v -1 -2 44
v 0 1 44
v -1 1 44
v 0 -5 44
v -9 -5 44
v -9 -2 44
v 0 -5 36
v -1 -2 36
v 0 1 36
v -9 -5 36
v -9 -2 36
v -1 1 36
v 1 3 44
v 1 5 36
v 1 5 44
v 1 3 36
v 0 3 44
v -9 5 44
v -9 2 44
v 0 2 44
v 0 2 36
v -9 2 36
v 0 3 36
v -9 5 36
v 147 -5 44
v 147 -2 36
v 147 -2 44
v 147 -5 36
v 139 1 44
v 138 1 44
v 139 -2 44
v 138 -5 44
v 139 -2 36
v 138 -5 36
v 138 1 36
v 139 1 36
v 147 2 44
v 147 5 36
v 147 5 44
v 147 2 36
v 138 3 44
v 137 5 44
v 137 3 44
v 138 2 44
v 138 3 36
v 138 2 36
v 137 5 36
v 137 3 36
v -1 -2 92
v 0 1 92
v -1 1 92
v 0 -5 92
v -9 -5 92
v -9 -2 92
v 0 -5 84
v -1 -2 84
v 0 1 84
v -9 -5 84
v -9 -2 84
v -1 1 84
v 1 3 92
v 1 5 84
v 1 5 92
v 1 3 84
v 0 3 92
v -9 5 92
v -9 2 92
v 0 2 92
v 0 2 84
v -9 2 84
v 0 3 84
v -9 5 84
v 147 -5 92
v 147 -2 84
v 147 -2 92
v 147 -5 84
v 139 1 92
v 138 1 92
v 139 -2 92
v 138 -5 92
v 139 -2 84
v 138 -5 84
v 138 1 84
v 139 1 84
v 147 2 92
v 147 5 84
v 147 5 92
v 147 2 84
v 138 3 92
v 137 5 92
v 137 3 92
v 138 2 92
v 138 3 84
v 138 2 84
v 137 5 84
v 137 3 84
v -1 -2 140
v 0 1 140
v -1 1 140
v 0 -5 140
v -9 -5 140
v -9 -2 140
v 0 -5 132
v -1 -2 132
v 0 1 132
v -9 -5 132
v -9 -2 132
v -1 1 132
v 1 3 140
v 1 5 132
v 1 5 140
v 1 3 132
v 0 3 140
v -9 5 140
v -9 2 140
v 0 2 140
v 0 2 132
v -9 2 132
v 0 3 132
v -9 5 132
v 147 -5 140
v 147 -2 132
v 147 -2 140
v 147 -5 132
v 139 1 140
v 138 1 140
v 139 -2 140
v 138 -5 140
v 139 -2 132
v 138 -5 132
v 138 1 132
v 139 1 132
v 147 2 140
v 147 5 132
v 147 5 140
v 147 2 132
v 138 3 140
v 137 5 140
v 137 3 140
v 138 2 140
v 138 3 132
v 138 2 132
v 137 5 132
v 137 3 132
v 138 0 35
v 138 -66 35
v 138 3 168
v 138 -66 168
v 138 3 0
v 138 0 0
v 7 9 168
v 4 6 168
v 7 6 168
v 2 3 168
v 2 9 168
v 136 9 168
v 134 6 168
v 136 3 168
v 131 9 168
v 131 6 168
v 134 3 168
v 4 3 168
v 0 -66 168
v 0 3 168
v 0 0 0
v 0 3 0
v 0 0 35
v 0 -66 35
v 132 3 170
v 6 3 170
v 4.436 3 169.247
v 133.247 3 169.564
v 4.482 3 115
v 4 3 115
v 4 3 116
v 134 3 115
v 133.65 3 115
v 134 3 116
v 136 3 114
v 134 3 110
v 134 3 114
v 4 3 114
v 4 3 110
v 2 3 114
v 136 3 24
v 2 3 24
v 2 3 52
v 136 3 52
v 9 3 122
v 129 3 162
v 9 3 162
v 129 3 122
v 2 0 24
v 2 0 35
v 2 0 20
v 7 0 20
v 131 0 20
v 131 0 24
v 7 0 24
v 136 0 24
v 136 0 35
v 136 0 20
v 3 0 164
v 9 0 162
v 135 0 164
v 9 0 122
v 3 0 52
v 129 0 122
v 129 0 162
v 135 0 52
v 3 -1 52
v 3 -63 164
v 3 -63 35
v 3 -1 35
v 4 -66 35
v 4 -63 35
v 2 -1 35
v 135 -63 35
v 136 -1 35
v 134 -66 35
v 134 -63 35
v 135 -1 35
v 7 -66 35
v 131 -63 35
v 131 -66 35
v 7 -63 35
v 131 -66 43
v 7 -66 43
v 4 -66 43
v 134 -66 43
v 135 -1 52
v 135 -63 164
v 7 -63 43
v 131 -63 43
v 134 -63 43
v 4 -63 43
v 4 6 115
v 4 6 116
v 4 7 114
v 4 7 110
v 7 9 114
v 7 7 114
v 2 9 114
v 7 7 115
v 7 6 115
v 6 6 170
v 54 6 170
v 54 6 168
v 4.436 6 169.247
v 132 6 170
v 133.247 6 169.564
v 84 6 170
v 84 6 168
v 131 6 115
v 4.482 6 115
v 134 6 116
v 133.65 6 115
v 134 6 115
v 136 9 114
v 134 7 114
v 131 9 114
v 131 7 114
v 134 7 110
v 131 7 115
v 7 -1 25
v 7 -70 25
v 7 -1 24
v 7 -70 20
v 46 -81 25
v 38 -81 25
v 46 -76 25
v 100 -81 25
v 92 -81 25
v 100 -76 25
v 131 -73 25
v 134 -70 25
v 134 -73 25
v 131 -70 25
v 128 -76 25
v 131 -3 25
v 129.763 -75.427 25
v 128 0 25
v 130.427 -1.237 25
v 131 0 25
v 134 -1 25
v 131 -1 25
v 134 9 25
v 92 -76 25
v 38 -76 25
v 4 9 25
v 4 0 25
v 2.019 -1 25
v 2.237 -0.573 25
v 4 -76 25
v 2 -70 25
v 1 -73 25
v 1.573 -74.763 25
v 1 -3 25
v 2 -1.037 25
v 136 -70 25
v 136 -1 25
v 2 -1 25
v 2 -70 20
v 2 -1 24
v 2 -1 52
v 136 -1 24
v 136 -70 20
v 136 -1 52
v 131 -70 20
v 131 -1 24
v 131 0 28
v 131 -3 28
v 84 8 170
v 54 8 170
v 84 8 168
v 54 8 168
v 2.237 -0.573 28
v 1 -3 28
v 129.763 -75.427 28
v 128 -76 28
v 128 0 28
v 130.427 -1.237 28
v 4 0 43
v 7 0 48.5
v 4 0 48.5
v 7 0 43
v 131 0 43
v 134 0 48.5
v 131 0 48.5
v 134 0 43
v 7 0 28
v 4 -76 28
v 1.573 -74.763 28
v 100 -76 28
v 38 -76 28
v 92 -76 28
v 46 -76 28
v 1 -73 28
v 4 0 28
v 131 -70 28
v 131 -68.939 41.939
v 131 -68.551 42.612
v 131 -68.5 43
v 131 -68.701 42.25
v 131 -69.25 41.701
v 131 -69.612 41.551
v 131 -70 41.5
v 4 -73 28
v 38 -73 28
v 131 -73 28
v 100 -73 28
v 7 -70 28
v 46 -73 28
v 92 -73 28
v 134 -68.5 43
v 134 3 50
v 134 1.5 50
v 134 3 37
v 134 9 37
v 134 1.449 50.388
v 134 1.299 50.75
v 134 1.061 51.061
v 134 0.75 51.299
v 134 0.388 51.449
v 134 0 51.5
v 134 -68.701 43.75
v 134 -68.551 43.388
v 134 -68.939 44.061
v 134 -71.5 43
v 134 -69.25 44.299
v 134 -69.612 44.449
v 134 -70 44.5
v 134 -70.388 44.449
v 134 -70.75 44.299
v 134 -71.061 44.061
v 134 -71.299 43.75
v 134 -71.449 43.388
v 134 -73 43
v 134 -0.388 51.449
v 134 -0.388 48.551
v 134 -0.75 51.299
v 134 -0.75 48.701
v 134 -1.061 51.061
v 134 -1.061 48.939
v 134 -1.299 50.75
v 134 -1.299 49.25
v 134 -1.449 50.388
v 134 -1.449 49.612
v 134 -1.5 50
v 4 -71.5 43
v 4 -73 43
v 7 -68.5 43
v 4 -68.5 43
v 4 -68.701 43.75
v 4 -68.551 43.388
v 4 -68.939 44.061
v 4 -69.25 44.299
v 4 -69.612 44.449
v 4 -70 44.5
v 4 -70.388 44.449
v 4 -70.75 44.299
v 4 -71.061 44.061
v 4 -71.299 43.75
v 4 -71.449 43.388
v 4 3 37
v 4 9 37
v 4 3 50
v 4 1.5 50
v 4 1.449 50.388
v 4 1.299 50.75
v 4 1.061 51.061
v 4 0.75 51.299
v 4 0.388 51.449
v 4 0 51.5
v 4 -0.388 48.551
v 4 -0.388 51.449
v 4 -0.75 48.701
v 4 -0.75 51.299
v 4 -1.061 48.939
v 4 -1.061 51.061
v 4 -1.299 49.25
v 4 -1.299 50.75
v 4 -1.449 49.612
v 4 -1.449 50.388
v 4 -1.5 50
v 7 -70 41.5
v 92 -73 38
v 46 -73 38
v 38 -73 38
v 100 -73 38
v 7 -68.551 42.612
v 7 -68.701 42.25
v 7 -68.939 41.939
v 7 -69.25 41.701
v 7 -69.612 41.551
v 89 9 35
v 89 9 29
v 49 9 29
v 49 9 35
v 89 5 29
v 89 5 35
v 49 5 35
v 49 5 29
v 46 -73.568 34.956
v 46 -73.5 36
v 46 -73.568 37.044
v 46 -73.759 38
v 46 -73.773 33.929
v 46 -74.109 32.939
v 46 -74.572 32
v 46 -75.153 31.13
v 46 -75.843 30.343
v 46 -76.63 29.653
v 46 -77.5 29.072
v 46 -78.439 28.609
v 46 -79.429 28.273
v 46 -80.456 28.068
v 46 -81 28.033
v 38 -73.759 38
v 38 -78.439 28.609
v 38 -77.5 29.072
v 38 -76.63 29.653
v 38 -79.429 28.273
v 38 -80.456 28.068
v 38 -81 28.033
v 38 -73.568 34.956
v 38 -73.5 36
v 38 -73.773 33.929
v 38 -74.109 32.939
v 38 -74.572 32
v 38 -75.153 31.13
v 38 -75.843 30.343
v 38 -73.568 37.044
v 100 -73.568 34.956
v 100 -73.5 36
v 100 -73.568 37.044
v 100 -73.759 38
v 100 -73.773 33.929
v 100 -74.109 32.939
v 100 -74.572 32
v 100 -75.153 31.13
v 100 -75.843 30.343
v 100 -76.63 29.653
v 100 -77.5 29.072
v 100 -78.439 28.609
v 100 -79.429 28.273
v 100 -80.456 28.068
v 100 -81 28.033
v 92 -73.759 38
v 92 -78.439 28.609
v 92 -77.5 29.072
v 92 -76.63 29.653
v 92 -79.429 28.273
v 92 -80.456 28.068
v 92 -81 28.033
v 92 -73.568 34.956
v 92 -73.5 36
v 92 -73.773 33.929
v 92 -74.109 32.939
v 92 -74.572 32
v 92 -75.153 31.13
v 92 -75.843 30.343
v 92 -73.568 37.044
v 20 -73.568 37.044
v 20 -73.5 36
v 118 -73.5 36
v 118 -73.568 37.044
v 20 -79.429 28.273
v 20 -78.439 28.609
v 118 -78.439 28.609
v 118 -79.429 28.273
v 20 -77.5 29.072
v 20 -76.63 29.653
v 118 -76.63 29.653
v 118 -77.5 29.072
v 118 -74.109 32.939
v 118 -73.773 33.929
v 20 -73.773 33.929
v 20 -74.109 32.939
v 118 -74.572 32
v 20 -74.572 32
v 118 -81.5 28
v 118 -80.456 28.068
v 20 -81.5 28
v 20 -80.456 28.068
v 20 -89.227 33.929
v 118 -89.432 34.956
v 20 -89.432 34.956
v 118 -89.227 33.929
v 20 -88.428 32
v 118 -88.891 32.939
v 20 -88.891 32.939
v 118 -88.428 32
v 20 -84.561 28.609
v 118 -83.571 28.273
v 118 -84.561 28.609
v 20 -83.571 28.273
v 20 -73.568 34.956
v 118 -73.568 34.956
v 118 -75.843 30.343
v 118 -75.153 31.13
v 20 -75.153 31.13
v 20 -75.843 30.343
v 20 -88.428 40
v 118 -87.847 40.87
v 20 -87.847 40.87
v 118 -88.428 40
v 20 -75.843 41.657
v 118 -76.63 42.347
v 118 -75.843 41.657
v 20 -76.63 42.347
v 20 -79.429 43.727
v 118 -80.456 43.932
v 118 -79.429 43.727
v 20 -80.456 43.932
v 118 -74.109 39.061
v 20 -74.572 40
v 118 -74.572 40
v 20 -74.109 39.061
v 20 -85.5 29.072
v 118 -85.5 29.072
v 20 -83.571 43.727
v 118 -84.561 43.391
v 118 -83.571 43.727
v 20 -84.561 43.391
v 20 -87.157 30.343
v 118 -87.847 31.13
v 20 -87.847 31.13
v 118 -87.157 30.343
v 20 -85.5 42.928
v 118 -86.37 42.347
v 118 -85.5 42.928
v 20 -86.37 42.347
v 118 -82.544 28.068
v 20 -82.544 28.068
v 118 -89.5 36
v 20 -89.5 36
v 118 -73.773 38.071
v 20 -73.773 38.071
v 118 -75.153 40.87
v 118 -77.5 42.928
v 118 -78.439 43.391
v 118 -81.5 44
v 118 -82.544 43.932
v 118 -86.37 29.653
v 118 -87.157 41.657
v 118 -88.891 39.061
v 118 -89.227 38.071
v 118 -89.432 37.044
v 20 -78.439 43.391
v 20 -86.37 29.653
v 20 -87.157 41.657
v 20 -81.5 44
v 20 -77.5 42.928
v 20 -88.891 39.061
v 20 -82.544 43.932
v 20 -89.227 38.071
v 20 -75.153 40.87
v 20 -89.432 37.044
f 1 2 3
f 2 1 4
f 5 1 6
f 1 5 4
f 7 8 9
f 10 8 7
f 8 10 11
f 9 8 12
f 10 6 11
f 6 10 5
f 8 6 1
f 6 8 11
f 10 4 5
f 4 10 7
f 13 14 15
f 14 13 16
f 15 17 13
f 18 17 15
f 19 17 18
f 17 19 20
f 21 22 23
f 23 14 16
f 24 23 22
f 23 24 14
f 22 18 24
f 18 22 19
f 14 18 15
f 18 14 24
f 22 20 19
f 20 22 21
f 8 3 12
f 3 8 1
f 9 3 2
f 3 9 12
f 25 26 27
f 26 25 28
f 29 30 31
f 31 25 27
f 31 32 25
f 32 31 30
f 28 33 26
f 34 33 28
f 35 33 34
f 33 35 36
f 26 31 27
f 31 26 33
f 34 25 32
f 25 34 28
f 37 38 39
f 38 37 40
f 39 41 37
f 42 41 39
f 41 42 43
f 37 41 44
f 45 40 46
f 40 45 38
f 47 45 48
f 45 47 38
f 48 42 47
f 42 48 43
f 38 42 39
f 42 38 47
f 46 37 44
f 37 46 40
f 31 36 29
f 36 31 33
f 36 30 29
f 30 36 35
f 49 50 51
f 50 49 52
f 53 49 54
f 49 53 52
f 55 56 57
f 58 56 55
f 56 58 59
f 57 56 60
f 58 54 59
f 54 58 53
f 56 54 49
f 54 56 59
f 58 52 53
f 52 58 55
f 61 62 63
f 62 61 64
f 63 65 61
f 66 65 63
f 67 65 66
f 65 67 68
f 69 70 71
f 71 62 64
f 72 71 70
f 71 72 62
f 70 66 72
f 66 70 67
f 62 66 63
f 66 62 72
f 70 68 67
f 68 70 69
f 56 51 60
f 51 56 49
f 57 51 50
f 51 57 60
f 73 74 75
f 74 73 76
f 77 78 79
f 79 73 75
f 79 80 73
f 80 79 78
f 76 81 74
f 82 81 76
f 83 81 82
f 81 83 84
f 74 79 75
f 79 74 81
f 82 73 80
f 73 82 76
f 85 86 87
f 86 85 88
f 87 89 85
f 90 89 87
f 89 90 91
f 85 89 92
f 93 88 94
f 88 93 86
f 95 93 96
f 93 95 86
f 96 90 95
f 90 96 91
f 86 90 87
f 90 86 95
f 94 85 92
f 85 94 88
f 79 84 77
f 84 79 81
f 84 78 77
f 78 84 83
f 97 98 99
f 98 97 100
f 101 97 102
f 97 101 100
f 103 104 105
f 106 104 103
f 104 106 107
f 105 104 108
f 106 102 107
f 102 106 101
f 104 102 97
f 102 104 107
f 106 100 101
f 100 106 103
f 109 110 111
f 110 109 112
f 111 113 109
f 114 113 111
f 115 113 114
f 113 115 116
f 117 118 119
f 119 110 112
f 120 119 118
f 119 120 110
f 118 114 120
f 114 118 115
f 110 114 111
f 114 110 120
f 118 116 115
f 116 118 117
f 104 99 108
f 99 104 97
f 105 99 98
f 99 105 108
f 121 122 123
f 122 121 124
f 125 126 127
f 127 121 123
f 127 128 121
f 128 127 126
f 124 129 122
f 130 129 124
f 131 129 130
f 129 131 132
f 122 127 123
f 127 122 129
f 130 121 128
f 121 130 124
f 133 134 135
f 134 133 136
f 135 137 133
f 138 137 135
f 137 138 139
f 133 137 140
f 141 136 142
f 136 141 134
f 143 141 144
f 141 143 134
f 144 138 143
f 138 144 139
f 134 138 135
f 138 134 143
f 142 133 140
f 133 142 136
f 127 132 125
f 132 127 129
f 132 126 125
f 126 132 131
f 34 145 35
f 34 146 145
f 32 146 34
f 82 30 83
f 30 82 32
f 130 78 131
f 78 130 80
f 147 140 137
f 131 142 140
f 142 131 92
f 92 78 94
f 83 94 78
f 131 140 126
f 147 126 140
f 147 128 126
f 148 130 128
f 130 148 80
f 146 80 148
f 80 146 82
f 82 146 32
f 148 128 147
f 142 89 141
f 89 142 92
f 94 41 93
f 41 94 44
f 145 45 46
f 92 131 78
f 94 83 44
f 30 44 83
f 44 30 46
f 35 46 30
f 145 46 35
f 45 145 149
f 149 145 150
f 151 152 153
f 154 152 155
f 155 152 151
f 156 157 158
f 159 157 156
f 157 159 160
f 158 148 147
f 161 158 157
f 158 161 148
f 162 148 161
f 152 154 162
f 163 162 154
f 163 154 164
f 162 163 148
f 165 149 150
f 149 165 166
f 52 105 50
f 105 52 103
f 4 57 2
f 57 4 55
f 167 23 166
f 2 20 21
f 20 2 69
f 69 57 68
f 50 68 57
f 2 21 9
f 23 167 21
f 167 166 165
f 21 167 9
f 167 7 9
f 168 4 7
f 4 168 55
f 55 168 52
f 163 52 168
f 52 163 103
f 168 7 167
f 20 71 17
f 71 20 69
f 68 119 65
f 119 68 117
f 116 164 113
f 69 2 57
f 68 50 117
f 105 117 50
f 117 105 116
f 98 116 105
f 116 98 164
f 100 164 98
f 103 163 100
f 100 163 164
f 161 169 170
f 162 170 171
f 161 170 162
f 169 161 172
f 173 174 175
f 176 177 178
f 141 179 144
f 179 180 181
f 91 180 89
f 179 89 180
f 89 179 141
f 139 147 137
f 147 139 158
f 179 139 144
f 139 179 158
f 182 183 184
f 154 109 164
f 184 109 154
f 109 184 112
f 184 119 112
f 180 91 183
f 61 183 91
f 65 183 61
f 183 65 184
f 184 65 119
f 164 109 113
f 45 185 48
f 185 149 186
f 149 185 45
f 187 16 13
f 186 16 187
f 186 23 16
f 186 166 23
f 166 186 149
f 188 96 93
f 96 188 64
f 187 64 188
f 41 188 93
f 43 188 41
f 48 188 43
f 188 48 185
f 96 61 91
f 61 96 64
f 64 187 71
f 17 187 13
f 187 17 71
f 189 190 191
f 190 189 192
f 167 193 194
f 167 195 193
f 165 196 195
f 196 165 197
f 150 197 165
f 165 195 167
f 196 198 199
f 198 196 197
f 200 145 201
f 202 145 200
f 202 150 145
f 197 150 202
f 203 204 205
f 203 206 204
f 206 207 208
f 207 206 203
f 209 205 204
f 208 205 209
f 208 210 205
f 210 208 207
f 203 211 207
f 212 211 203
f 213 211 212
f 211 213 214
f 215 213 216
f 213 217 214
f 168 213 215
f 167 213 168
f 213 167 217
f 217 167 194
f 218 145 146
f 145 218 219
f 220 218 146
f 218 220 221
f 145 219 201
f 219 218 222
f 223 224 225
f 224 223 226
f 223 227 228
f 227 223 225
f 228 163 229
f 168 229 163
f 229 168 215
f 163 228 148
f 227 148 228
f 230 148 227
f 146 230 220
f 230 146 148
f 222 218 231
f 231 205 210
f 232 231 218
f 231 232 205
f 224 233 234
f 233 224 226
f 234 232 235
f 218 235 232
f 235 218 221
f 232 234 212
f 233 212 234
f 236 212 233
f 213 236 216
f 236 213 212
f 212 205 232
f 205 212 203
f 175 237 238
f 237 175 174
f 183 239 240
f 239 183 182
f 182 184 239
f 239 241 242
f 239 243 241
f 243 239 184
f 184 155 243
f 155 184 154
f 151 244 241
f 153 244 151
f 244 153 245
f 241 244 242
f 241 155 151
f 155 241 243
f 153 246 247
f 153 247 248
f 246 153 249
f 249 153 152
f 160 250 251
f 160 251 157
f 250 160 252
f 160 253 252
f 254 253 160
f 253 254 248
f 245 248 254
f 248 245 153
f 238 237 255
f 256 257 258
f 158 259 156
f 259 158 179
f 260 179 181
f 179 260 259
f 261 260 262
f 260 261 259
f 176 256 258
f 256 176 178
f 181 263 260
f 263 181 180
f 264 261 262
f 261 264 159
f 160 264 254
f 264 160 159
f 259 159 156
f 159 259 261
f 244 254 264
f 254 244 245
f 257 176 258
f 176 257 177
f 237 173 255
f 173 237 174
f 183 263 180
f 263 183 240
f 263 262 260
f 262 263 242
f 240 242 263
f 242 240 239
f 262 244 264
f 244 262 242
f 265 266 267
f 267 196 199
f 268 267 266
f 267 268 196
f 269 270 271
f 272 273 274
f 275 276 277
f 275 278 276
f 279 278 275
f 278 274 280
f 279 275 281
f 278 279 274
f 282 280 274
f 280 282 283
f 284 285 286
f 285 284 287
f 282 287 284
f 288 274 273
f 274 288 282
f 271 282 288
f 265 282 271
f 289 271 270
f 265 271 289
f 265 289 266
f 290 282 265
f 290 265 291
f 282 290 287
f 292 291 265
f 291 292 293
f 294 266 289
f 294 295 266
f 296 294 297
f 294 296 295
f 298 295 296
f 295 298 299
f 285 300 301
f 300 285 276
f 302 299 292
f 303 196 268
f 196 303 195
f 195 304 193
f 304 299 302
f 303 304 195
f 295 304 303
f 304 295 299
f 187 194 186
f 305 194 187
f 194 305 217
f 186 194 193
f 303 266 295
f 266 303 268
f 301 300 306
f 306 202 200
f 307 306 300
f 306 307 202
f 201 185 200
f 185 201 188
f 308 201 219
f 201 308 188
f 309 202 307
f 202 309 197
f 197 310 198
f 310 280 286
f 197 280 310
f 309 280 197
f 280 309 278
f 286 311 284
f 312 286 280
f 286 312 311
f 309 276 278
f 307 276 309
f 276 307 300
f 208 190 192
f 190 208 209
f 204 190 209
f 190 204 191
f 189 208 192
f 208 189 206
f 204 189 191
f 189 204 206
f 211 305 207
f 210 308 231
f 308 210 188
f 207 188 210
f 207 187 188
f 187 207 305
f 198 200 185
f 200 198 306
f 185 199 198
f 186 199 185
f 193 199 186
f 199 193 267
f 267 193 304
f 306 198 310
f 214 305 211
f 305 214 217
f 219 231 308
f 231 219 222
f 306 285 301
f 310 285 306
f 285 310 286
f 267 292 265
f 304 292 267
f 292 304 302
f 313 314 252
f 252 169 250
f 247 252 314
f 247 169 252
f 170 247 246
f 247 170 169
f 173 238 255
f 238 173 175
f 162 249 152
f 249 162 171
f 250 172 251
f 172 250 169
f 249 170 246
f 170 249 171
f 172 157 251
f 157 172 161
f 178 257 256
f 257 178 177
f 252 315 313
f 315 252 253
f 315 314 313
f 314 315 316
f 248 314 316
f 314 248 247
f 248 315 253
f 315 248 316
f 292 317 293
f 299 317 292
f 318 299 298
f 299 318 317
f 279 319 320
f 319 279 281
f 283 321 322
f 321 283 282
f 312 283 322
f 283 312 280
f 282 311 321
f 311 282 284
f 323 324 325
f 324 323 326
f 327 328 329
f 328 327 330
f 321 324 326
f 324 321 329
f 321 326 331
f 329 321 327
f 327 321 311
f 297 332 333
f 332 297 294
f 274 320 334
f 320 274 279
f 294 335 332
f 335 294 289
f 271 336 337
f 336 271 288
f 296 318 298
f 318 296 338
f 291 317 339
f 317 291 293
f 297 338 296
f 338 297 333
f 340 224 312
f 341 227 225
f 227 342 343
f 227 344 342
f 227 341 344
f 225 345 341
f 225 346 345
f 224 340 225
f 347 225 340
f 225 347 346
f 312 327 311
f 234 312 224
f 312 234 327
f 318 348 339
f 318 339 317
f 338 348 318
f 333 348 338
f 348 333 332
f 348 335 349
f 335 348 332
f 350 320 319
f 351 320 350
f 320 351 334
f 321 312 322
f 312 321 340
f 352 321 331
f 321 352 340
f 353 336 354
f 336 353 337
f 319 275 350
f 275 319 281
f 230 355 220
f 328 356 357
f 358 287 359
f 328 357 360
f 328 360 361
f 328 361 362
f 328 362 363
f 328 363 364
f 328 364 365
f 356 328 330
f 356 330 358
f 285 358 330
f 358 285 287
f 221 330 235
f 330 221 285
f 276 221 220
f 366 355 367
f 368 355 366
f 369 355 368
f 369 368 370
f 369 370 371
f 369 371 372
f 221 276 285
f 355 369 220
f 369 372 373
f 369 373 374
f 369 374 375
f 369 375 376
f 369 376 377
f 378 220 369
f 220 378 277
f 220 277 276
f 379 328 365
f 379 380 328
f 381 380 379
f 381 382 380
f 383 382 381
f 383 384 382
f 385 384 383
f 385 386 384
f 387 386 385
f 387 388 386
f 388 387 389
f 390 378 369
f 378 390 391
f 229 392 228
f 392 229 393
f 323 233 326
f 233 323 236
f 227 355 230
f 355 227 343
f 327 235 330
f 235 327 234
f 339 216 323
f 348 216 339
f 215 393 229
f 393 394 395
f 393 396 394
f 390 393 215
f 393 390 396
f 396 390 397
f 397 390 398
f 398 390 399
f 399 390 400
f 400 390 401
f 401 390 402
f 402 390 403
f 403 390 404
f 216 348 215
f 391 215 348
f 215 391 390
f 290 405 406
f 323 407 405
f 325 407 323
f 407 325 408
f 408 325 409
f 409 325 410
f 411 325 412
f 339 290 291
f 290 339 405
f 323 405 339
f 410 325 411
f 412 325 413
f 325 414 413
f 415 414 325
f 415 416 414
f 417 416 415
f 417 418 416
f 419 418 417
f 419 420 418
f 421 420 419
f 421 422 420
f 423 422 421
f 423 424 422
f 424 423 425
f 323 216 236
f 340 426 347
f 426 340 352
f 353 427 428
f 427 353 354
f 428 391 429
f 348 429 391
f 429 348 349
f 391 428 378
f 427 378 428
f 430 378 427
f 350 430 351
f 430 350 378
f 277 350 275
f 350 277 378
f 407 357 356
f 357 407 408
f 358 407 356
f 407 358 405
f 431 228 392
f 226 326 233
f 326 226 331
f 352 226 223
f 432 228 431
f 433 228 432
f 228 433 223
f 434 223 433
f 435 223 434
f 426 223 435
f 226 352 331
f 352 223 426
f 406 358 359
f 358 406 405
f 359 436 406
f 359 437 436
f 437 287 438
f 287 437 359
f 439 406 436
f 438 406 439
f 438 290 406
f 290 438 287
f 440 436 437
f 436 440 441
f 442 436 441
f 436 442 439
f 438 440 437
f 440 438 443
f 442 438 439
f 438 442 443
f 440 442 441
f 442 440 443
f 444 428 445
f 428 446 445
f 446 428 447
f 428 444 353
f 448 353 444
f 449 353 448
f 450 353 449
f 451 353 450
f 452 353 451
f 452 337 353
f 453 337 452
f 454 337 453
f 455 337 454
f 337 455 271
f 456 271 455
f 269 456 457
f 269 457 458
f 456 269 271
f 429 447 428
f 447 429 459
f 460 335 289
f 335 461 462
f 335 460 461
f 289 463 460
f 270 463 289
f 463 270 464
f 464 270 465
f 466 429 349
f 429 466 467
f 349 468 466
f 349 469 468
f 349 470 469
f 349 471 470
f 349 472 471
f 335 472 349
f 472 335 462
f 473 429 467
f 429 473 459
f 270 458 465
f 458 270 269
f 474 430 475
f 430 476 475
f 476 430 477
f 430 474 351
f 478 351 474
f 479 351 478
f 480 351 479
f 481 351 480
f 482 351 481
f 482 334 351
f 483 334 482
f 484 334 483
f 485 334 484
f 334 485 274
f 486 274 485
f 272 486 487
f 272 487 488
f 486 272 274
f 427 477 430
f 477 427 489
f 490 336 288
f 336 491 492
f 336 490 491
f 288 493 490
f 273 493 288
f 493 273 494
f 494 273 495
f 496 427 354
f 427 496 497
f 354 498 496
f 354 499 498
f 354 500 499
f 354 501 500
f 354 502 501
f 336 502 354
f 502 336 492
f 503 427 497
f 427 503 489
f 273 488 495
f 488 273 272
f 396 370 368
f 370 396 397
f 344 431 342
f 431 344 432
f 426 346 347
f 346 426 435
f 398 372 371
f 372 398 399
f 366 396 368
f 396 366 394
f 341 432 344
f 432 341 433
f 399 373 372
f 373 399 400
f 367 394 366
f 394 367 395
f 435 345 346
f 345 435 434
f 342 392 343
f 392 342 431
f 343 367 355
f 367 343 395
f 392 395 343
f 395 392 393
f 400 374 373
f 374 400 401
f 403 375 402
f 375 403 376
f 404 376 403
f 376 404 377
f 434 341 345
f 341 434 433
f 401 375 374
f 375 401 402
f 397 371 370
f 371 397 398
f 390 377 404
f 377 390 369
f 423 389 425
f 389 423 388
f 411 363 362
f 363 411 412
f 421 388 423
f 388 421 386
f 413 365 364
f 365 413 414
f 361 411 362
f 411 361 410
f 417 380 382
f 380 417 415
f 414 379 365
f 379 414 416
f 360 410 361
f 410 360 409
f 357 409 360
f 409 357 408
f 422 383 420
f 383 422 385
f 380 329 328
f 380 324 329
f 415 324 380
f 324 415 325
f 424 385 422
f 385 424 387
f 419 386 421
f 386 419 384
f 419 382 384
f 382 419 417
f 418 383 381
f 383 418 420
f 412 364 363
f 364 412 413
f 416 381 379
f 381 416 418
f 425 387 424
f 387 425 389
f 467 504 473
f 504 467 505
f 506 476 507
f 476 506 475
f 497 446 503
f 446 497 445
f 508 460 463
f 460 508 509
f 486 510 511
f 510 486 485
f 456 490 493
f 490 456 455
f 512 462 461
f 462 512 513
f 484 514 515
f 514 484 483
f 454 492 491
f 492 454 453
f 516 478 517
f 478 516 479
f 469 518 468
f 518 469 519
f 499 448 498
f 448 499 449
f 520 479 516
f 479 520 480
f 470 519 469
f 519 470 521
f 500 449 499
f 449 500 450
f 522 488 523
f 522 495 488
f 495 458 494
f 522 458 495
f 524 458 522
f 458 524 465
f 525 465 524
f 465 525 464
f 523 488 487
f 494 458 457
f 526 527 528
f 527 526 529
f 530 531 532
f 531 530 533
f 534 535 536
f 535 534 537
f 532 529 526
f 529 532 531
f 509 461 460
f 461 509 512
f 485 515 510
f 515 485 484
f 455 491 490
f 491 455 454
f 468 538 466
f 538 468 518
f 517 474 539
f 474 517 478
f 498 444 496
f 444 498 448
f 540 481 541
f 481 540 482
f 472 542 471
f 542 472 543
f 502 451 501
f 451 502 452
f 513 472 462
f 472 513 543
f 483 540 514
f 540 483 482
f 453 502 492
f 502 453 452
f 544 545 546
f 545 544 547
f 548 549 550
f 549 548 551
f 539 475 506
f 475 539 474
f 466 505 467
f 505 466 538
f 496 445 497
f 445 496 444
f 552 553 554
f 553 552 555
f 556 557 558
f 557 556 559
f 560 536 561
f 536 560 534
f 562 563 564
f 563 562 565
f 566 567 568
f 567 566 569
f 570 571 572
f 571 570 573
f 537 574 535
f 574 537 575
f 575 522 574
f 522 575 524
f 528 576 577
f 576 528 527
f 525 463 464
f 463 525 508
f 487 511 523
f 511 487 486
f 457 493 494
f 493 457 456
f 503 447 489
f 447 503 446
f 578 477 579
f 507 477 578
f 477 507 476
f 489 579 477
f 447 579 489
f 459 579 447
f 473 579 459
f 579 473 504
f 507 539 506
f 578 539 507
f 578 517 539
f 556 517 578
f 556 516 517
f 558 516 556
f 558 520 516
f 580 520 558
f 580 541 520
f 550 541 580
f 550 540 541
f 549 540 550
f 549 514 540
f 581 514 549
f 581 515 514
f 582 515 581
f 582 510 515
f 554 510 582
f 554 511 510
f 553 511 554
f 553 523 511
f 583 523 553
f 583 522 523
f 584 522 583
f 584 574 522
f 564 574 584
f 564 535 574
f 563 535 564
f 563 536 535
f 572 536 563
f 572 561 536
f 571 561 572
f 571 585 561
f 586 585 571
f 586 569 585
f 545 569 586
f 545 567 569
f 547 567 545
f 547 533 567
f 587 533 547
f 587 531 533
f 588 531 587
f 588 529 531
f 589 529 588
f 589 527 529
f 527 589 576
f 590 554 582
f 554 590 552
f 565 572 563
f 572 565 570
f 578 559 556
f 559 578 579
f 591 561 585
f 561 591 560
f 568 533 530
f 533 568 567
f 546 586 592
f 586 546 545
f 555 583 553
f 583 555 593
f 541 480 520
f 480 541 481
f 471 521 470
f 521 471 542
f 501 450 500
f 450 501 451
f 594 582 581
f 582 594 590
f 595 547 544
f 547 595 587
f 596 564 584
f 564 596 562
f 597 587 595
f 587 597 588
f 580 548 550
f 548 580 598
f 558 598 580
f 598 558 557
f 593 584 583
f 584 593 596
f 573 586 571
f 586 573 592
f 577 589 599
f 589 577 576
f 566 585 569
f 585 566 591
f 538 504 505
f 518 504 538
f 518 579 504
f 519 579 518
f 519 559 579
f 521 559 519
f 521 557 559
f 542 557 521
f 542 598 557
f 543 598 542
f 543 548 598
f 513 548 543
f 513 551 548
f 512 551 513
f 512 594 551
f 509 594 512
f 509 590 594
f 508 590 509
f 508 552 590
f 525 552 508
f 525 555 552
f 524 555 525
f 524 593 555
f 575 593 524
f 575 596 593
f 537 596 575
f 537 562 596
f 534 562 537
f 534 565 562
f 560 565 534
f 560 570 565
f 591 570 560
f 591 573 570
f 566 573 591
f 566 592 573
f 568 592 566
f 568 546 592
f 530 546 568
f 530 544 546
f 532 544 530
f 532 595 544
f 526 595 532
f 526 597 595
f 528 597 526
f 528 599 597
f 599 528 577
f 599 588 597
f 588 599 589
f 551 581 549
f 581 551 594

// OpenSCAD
// Parametric seed hopper, green-cheek conure, Bambu A1 mini, PETG.
// Frame: X across door (printed vertical so layers run with seed flow),
// Y depth (+Y = outside cage), Z up. Plate closes the door opening; the bin
// hangs inside; the fill port in the plate latches from outside only.

part = "assembly"; // body | lid | tray | interior | assembly

plate_w = 138; plate_h = 168; plate_t = 3; wall = 3;
cx0 = 3; cx1 = 135; cy0 = -63; cy1 = -3; cz0 = 35; cz1 = 165;
bin_y0 = -66;
roof_z = cz1;

bar_d = 3; bar_lx = -6; bar_rx = 144;  // vertical bars flanking the opening

port_x0 = 9; port_x1 = 129; port_z0 = 122; port_z1 = 162;
lid_x0 = 4; lid_x1 = 134; lid_z0 = 114; lid_z1 = 170; lid_t = 3;

tray_x0 = 4; tray_x1 = 134; tray_y0 = -73; tray_y1 = 3; tray_z0 = 25;
cut_z0 = 24; cut_z1 = 52;

module side_clips(zc) {
  for (bx = [bar_lx, bar_rx]) {
    xe = bx < 0 ? bx - 3 : plate_w - 1;
    len = bx < 0 ? 1 - xe : bx + 3 - xe;
    translate([xe, -5, zc]) cube([len, 3, 8]);
    translate([xe, 2, zc]) cube([len, 3, 8]);
    translate([bx < 0 ? -1 : plate_w - 1, -3, zc]) cube([2, 4, 8]);
  }
}

module body() {
  difference() {
    union() {
      cube([plate_w, plate_t, plate_h]);
      translate([0, bin_y0, 35]) cube([wall, 1 - bin_y0, cz1 - 35]);
      translate([cx1, bin_y0, 35]) cube([wall, 1 - bin_y0, cz1 - 35]);
      translate([0, bin_y0, 35]) cube([plate_w, wall, cz1 - 35]);
      translate([0, bin_y0, roof_z - 1]) cube([plate_w, 1 - bin_y0, plate_h - roof_z + 1]);
      side_clips(36);
      side_clips(84);
      side_clips(132);
      translate([2, 2, lid_z0]) cube([2, 5, plate_h - lid_z0]);
      translate([2, 6, lid_z0]) cube([5, 3, plate_h - lid_z0]);
      translate([134, 2, lid_z0]) cube([2, 5, plate_h - lid_z0]);
      translate([131, 6, lid_z0]) cube([5, 3, plate_h - lid_z0]);
      translate([lid_x0, 2, lid_z0 - 4]) cube([lid_x1 - lid_x0, 5, 5]);
      translate([2, -70, 20]) cube([5, 72, 5]);
      translate([131, -70, 20]) cube([5, 72, 5]);
    }
    translate([port_x0, -1, port_z0])
      cube([port_x1 - port_x0, plate_t + 2, port_z1 - port_z0]);
    translate([2, -1, cut_z0]) cube([134, plate_t + 2, cut_z1 - cut_z0]);
  }
}

module lid() {
  w = lid_x1 - lid_x0;
  h = lid_z1 - lid_z0;
  translate([2, 2, 0]) linear_extrude(lid_t) offset(r = 2)
    square([w - 4, h - 4]);
  translate([w / 2 - 15, h - 2, -2]) cube([30, 2, 2]);
}

module tray() {
  w = tray_x1 - tray_x0;
  d = tray_y1 - tray_y0;
  difference() {
    union() {
      linear_extrude(3) offset(r = 3) square([w - 6, d - 6]);
      cube([w, wall, 18]);
      translate([0, d - wall, 0]) cube([w, wall, 25]);
      cube([wall, d, 18]);
      translate([w - wall, 0, 0]) cube([wall, d, 18]);
      translate([0, d, 0]) cube([w, 6, 12]);
    }
    translate([wall, wall, 3]) cube([w - 2 * wall, d - 2 * wall, 40]);
    translate([w / 2 - 20, d + 2, 4]) cube([40, 6, 6]);
  }
  translate([0, wall, 18]) rotate([0, 90, 0]) cylinder(h = w, r = 1.5, $fn = 24);
  translate([0, d - wall, 25]) rotate([0, 90, 0]) cylinder(h = w, r = 1.5, $fn = 24);
  translate([w / 2, -8.5, 11]) rotate([0, 90, 0])
    cylinder(h = 98, r = 8, center = true, $fn = 48);
  for (x = [34, 88]) translate([x, -8, 0]) cube([8, 9, 13]);
}

if (part == "body") body();
else if (part == "lid") lid();
else if (part == "tray") tray();
else if (part == "interior")
  translate([cx0, cy0, cz0]) cube([cx1 - cx0, cy1 - cy0, cz1 - cz0]);
else {
  color("lightsteelblue") body();
  color("khaki") translate([lid_x0, plate_t + lid_t, lid_z0])
    rotate([90, 0, 0]) lid();
  color("salmon") translate([tray_x0, tray_y0, tray_z0]) tray();
}

echo(str("cavity_mm3=", (cx1-cx0)*(cy1-cy0)*(cz1-cz0)));
echo(str("outlet_mm=", cy1-cy0, " x ", cx1-cx0, " wall_angle_deg=90"));
